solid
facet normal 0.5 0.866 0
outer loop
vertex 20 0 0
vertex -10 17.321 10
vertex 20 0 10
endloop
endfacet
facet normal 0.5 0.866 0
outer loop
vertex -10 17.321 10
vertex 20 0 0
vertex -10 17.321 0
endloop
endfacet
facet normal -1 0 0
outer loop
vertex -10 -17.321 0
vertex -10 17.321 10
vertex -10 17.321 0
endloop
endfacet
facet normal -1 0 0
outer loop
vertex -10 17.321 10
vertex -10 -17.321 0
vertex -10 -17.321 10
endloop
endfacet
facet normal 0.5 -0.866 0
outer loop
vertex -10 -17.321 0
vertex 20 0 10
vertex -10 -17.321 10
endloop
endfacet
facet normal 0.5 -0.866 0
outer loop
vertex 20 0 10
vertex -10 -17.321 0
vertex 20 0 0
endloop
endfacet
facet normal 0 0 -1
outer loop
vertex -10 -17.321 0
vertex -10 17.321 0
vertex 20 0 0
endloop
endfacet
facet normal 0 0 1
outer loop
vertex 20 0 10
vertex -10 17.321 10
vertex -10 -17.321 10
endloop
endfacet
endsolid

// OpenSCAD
// Module Star Instructions 
// A module helps you to make copies. 
// After looking at this code:  
// 1 Uncomment the second copy of myshape to make a star. Now comment it again. 
// 2. Change the value of $fn in the module to make a square shape  
// 3. Use your square shape plus two rotated copies (the first rotated by 60 degrees and the second rotated by  120 degrees) to make a 12 sided star 

module myshape()
{
cylinder(r = 20, h = 10, $fn = 3);
}


myshape();

// This is a second copy of myshape, but this one is rotated
// rotate(60) myshape();
